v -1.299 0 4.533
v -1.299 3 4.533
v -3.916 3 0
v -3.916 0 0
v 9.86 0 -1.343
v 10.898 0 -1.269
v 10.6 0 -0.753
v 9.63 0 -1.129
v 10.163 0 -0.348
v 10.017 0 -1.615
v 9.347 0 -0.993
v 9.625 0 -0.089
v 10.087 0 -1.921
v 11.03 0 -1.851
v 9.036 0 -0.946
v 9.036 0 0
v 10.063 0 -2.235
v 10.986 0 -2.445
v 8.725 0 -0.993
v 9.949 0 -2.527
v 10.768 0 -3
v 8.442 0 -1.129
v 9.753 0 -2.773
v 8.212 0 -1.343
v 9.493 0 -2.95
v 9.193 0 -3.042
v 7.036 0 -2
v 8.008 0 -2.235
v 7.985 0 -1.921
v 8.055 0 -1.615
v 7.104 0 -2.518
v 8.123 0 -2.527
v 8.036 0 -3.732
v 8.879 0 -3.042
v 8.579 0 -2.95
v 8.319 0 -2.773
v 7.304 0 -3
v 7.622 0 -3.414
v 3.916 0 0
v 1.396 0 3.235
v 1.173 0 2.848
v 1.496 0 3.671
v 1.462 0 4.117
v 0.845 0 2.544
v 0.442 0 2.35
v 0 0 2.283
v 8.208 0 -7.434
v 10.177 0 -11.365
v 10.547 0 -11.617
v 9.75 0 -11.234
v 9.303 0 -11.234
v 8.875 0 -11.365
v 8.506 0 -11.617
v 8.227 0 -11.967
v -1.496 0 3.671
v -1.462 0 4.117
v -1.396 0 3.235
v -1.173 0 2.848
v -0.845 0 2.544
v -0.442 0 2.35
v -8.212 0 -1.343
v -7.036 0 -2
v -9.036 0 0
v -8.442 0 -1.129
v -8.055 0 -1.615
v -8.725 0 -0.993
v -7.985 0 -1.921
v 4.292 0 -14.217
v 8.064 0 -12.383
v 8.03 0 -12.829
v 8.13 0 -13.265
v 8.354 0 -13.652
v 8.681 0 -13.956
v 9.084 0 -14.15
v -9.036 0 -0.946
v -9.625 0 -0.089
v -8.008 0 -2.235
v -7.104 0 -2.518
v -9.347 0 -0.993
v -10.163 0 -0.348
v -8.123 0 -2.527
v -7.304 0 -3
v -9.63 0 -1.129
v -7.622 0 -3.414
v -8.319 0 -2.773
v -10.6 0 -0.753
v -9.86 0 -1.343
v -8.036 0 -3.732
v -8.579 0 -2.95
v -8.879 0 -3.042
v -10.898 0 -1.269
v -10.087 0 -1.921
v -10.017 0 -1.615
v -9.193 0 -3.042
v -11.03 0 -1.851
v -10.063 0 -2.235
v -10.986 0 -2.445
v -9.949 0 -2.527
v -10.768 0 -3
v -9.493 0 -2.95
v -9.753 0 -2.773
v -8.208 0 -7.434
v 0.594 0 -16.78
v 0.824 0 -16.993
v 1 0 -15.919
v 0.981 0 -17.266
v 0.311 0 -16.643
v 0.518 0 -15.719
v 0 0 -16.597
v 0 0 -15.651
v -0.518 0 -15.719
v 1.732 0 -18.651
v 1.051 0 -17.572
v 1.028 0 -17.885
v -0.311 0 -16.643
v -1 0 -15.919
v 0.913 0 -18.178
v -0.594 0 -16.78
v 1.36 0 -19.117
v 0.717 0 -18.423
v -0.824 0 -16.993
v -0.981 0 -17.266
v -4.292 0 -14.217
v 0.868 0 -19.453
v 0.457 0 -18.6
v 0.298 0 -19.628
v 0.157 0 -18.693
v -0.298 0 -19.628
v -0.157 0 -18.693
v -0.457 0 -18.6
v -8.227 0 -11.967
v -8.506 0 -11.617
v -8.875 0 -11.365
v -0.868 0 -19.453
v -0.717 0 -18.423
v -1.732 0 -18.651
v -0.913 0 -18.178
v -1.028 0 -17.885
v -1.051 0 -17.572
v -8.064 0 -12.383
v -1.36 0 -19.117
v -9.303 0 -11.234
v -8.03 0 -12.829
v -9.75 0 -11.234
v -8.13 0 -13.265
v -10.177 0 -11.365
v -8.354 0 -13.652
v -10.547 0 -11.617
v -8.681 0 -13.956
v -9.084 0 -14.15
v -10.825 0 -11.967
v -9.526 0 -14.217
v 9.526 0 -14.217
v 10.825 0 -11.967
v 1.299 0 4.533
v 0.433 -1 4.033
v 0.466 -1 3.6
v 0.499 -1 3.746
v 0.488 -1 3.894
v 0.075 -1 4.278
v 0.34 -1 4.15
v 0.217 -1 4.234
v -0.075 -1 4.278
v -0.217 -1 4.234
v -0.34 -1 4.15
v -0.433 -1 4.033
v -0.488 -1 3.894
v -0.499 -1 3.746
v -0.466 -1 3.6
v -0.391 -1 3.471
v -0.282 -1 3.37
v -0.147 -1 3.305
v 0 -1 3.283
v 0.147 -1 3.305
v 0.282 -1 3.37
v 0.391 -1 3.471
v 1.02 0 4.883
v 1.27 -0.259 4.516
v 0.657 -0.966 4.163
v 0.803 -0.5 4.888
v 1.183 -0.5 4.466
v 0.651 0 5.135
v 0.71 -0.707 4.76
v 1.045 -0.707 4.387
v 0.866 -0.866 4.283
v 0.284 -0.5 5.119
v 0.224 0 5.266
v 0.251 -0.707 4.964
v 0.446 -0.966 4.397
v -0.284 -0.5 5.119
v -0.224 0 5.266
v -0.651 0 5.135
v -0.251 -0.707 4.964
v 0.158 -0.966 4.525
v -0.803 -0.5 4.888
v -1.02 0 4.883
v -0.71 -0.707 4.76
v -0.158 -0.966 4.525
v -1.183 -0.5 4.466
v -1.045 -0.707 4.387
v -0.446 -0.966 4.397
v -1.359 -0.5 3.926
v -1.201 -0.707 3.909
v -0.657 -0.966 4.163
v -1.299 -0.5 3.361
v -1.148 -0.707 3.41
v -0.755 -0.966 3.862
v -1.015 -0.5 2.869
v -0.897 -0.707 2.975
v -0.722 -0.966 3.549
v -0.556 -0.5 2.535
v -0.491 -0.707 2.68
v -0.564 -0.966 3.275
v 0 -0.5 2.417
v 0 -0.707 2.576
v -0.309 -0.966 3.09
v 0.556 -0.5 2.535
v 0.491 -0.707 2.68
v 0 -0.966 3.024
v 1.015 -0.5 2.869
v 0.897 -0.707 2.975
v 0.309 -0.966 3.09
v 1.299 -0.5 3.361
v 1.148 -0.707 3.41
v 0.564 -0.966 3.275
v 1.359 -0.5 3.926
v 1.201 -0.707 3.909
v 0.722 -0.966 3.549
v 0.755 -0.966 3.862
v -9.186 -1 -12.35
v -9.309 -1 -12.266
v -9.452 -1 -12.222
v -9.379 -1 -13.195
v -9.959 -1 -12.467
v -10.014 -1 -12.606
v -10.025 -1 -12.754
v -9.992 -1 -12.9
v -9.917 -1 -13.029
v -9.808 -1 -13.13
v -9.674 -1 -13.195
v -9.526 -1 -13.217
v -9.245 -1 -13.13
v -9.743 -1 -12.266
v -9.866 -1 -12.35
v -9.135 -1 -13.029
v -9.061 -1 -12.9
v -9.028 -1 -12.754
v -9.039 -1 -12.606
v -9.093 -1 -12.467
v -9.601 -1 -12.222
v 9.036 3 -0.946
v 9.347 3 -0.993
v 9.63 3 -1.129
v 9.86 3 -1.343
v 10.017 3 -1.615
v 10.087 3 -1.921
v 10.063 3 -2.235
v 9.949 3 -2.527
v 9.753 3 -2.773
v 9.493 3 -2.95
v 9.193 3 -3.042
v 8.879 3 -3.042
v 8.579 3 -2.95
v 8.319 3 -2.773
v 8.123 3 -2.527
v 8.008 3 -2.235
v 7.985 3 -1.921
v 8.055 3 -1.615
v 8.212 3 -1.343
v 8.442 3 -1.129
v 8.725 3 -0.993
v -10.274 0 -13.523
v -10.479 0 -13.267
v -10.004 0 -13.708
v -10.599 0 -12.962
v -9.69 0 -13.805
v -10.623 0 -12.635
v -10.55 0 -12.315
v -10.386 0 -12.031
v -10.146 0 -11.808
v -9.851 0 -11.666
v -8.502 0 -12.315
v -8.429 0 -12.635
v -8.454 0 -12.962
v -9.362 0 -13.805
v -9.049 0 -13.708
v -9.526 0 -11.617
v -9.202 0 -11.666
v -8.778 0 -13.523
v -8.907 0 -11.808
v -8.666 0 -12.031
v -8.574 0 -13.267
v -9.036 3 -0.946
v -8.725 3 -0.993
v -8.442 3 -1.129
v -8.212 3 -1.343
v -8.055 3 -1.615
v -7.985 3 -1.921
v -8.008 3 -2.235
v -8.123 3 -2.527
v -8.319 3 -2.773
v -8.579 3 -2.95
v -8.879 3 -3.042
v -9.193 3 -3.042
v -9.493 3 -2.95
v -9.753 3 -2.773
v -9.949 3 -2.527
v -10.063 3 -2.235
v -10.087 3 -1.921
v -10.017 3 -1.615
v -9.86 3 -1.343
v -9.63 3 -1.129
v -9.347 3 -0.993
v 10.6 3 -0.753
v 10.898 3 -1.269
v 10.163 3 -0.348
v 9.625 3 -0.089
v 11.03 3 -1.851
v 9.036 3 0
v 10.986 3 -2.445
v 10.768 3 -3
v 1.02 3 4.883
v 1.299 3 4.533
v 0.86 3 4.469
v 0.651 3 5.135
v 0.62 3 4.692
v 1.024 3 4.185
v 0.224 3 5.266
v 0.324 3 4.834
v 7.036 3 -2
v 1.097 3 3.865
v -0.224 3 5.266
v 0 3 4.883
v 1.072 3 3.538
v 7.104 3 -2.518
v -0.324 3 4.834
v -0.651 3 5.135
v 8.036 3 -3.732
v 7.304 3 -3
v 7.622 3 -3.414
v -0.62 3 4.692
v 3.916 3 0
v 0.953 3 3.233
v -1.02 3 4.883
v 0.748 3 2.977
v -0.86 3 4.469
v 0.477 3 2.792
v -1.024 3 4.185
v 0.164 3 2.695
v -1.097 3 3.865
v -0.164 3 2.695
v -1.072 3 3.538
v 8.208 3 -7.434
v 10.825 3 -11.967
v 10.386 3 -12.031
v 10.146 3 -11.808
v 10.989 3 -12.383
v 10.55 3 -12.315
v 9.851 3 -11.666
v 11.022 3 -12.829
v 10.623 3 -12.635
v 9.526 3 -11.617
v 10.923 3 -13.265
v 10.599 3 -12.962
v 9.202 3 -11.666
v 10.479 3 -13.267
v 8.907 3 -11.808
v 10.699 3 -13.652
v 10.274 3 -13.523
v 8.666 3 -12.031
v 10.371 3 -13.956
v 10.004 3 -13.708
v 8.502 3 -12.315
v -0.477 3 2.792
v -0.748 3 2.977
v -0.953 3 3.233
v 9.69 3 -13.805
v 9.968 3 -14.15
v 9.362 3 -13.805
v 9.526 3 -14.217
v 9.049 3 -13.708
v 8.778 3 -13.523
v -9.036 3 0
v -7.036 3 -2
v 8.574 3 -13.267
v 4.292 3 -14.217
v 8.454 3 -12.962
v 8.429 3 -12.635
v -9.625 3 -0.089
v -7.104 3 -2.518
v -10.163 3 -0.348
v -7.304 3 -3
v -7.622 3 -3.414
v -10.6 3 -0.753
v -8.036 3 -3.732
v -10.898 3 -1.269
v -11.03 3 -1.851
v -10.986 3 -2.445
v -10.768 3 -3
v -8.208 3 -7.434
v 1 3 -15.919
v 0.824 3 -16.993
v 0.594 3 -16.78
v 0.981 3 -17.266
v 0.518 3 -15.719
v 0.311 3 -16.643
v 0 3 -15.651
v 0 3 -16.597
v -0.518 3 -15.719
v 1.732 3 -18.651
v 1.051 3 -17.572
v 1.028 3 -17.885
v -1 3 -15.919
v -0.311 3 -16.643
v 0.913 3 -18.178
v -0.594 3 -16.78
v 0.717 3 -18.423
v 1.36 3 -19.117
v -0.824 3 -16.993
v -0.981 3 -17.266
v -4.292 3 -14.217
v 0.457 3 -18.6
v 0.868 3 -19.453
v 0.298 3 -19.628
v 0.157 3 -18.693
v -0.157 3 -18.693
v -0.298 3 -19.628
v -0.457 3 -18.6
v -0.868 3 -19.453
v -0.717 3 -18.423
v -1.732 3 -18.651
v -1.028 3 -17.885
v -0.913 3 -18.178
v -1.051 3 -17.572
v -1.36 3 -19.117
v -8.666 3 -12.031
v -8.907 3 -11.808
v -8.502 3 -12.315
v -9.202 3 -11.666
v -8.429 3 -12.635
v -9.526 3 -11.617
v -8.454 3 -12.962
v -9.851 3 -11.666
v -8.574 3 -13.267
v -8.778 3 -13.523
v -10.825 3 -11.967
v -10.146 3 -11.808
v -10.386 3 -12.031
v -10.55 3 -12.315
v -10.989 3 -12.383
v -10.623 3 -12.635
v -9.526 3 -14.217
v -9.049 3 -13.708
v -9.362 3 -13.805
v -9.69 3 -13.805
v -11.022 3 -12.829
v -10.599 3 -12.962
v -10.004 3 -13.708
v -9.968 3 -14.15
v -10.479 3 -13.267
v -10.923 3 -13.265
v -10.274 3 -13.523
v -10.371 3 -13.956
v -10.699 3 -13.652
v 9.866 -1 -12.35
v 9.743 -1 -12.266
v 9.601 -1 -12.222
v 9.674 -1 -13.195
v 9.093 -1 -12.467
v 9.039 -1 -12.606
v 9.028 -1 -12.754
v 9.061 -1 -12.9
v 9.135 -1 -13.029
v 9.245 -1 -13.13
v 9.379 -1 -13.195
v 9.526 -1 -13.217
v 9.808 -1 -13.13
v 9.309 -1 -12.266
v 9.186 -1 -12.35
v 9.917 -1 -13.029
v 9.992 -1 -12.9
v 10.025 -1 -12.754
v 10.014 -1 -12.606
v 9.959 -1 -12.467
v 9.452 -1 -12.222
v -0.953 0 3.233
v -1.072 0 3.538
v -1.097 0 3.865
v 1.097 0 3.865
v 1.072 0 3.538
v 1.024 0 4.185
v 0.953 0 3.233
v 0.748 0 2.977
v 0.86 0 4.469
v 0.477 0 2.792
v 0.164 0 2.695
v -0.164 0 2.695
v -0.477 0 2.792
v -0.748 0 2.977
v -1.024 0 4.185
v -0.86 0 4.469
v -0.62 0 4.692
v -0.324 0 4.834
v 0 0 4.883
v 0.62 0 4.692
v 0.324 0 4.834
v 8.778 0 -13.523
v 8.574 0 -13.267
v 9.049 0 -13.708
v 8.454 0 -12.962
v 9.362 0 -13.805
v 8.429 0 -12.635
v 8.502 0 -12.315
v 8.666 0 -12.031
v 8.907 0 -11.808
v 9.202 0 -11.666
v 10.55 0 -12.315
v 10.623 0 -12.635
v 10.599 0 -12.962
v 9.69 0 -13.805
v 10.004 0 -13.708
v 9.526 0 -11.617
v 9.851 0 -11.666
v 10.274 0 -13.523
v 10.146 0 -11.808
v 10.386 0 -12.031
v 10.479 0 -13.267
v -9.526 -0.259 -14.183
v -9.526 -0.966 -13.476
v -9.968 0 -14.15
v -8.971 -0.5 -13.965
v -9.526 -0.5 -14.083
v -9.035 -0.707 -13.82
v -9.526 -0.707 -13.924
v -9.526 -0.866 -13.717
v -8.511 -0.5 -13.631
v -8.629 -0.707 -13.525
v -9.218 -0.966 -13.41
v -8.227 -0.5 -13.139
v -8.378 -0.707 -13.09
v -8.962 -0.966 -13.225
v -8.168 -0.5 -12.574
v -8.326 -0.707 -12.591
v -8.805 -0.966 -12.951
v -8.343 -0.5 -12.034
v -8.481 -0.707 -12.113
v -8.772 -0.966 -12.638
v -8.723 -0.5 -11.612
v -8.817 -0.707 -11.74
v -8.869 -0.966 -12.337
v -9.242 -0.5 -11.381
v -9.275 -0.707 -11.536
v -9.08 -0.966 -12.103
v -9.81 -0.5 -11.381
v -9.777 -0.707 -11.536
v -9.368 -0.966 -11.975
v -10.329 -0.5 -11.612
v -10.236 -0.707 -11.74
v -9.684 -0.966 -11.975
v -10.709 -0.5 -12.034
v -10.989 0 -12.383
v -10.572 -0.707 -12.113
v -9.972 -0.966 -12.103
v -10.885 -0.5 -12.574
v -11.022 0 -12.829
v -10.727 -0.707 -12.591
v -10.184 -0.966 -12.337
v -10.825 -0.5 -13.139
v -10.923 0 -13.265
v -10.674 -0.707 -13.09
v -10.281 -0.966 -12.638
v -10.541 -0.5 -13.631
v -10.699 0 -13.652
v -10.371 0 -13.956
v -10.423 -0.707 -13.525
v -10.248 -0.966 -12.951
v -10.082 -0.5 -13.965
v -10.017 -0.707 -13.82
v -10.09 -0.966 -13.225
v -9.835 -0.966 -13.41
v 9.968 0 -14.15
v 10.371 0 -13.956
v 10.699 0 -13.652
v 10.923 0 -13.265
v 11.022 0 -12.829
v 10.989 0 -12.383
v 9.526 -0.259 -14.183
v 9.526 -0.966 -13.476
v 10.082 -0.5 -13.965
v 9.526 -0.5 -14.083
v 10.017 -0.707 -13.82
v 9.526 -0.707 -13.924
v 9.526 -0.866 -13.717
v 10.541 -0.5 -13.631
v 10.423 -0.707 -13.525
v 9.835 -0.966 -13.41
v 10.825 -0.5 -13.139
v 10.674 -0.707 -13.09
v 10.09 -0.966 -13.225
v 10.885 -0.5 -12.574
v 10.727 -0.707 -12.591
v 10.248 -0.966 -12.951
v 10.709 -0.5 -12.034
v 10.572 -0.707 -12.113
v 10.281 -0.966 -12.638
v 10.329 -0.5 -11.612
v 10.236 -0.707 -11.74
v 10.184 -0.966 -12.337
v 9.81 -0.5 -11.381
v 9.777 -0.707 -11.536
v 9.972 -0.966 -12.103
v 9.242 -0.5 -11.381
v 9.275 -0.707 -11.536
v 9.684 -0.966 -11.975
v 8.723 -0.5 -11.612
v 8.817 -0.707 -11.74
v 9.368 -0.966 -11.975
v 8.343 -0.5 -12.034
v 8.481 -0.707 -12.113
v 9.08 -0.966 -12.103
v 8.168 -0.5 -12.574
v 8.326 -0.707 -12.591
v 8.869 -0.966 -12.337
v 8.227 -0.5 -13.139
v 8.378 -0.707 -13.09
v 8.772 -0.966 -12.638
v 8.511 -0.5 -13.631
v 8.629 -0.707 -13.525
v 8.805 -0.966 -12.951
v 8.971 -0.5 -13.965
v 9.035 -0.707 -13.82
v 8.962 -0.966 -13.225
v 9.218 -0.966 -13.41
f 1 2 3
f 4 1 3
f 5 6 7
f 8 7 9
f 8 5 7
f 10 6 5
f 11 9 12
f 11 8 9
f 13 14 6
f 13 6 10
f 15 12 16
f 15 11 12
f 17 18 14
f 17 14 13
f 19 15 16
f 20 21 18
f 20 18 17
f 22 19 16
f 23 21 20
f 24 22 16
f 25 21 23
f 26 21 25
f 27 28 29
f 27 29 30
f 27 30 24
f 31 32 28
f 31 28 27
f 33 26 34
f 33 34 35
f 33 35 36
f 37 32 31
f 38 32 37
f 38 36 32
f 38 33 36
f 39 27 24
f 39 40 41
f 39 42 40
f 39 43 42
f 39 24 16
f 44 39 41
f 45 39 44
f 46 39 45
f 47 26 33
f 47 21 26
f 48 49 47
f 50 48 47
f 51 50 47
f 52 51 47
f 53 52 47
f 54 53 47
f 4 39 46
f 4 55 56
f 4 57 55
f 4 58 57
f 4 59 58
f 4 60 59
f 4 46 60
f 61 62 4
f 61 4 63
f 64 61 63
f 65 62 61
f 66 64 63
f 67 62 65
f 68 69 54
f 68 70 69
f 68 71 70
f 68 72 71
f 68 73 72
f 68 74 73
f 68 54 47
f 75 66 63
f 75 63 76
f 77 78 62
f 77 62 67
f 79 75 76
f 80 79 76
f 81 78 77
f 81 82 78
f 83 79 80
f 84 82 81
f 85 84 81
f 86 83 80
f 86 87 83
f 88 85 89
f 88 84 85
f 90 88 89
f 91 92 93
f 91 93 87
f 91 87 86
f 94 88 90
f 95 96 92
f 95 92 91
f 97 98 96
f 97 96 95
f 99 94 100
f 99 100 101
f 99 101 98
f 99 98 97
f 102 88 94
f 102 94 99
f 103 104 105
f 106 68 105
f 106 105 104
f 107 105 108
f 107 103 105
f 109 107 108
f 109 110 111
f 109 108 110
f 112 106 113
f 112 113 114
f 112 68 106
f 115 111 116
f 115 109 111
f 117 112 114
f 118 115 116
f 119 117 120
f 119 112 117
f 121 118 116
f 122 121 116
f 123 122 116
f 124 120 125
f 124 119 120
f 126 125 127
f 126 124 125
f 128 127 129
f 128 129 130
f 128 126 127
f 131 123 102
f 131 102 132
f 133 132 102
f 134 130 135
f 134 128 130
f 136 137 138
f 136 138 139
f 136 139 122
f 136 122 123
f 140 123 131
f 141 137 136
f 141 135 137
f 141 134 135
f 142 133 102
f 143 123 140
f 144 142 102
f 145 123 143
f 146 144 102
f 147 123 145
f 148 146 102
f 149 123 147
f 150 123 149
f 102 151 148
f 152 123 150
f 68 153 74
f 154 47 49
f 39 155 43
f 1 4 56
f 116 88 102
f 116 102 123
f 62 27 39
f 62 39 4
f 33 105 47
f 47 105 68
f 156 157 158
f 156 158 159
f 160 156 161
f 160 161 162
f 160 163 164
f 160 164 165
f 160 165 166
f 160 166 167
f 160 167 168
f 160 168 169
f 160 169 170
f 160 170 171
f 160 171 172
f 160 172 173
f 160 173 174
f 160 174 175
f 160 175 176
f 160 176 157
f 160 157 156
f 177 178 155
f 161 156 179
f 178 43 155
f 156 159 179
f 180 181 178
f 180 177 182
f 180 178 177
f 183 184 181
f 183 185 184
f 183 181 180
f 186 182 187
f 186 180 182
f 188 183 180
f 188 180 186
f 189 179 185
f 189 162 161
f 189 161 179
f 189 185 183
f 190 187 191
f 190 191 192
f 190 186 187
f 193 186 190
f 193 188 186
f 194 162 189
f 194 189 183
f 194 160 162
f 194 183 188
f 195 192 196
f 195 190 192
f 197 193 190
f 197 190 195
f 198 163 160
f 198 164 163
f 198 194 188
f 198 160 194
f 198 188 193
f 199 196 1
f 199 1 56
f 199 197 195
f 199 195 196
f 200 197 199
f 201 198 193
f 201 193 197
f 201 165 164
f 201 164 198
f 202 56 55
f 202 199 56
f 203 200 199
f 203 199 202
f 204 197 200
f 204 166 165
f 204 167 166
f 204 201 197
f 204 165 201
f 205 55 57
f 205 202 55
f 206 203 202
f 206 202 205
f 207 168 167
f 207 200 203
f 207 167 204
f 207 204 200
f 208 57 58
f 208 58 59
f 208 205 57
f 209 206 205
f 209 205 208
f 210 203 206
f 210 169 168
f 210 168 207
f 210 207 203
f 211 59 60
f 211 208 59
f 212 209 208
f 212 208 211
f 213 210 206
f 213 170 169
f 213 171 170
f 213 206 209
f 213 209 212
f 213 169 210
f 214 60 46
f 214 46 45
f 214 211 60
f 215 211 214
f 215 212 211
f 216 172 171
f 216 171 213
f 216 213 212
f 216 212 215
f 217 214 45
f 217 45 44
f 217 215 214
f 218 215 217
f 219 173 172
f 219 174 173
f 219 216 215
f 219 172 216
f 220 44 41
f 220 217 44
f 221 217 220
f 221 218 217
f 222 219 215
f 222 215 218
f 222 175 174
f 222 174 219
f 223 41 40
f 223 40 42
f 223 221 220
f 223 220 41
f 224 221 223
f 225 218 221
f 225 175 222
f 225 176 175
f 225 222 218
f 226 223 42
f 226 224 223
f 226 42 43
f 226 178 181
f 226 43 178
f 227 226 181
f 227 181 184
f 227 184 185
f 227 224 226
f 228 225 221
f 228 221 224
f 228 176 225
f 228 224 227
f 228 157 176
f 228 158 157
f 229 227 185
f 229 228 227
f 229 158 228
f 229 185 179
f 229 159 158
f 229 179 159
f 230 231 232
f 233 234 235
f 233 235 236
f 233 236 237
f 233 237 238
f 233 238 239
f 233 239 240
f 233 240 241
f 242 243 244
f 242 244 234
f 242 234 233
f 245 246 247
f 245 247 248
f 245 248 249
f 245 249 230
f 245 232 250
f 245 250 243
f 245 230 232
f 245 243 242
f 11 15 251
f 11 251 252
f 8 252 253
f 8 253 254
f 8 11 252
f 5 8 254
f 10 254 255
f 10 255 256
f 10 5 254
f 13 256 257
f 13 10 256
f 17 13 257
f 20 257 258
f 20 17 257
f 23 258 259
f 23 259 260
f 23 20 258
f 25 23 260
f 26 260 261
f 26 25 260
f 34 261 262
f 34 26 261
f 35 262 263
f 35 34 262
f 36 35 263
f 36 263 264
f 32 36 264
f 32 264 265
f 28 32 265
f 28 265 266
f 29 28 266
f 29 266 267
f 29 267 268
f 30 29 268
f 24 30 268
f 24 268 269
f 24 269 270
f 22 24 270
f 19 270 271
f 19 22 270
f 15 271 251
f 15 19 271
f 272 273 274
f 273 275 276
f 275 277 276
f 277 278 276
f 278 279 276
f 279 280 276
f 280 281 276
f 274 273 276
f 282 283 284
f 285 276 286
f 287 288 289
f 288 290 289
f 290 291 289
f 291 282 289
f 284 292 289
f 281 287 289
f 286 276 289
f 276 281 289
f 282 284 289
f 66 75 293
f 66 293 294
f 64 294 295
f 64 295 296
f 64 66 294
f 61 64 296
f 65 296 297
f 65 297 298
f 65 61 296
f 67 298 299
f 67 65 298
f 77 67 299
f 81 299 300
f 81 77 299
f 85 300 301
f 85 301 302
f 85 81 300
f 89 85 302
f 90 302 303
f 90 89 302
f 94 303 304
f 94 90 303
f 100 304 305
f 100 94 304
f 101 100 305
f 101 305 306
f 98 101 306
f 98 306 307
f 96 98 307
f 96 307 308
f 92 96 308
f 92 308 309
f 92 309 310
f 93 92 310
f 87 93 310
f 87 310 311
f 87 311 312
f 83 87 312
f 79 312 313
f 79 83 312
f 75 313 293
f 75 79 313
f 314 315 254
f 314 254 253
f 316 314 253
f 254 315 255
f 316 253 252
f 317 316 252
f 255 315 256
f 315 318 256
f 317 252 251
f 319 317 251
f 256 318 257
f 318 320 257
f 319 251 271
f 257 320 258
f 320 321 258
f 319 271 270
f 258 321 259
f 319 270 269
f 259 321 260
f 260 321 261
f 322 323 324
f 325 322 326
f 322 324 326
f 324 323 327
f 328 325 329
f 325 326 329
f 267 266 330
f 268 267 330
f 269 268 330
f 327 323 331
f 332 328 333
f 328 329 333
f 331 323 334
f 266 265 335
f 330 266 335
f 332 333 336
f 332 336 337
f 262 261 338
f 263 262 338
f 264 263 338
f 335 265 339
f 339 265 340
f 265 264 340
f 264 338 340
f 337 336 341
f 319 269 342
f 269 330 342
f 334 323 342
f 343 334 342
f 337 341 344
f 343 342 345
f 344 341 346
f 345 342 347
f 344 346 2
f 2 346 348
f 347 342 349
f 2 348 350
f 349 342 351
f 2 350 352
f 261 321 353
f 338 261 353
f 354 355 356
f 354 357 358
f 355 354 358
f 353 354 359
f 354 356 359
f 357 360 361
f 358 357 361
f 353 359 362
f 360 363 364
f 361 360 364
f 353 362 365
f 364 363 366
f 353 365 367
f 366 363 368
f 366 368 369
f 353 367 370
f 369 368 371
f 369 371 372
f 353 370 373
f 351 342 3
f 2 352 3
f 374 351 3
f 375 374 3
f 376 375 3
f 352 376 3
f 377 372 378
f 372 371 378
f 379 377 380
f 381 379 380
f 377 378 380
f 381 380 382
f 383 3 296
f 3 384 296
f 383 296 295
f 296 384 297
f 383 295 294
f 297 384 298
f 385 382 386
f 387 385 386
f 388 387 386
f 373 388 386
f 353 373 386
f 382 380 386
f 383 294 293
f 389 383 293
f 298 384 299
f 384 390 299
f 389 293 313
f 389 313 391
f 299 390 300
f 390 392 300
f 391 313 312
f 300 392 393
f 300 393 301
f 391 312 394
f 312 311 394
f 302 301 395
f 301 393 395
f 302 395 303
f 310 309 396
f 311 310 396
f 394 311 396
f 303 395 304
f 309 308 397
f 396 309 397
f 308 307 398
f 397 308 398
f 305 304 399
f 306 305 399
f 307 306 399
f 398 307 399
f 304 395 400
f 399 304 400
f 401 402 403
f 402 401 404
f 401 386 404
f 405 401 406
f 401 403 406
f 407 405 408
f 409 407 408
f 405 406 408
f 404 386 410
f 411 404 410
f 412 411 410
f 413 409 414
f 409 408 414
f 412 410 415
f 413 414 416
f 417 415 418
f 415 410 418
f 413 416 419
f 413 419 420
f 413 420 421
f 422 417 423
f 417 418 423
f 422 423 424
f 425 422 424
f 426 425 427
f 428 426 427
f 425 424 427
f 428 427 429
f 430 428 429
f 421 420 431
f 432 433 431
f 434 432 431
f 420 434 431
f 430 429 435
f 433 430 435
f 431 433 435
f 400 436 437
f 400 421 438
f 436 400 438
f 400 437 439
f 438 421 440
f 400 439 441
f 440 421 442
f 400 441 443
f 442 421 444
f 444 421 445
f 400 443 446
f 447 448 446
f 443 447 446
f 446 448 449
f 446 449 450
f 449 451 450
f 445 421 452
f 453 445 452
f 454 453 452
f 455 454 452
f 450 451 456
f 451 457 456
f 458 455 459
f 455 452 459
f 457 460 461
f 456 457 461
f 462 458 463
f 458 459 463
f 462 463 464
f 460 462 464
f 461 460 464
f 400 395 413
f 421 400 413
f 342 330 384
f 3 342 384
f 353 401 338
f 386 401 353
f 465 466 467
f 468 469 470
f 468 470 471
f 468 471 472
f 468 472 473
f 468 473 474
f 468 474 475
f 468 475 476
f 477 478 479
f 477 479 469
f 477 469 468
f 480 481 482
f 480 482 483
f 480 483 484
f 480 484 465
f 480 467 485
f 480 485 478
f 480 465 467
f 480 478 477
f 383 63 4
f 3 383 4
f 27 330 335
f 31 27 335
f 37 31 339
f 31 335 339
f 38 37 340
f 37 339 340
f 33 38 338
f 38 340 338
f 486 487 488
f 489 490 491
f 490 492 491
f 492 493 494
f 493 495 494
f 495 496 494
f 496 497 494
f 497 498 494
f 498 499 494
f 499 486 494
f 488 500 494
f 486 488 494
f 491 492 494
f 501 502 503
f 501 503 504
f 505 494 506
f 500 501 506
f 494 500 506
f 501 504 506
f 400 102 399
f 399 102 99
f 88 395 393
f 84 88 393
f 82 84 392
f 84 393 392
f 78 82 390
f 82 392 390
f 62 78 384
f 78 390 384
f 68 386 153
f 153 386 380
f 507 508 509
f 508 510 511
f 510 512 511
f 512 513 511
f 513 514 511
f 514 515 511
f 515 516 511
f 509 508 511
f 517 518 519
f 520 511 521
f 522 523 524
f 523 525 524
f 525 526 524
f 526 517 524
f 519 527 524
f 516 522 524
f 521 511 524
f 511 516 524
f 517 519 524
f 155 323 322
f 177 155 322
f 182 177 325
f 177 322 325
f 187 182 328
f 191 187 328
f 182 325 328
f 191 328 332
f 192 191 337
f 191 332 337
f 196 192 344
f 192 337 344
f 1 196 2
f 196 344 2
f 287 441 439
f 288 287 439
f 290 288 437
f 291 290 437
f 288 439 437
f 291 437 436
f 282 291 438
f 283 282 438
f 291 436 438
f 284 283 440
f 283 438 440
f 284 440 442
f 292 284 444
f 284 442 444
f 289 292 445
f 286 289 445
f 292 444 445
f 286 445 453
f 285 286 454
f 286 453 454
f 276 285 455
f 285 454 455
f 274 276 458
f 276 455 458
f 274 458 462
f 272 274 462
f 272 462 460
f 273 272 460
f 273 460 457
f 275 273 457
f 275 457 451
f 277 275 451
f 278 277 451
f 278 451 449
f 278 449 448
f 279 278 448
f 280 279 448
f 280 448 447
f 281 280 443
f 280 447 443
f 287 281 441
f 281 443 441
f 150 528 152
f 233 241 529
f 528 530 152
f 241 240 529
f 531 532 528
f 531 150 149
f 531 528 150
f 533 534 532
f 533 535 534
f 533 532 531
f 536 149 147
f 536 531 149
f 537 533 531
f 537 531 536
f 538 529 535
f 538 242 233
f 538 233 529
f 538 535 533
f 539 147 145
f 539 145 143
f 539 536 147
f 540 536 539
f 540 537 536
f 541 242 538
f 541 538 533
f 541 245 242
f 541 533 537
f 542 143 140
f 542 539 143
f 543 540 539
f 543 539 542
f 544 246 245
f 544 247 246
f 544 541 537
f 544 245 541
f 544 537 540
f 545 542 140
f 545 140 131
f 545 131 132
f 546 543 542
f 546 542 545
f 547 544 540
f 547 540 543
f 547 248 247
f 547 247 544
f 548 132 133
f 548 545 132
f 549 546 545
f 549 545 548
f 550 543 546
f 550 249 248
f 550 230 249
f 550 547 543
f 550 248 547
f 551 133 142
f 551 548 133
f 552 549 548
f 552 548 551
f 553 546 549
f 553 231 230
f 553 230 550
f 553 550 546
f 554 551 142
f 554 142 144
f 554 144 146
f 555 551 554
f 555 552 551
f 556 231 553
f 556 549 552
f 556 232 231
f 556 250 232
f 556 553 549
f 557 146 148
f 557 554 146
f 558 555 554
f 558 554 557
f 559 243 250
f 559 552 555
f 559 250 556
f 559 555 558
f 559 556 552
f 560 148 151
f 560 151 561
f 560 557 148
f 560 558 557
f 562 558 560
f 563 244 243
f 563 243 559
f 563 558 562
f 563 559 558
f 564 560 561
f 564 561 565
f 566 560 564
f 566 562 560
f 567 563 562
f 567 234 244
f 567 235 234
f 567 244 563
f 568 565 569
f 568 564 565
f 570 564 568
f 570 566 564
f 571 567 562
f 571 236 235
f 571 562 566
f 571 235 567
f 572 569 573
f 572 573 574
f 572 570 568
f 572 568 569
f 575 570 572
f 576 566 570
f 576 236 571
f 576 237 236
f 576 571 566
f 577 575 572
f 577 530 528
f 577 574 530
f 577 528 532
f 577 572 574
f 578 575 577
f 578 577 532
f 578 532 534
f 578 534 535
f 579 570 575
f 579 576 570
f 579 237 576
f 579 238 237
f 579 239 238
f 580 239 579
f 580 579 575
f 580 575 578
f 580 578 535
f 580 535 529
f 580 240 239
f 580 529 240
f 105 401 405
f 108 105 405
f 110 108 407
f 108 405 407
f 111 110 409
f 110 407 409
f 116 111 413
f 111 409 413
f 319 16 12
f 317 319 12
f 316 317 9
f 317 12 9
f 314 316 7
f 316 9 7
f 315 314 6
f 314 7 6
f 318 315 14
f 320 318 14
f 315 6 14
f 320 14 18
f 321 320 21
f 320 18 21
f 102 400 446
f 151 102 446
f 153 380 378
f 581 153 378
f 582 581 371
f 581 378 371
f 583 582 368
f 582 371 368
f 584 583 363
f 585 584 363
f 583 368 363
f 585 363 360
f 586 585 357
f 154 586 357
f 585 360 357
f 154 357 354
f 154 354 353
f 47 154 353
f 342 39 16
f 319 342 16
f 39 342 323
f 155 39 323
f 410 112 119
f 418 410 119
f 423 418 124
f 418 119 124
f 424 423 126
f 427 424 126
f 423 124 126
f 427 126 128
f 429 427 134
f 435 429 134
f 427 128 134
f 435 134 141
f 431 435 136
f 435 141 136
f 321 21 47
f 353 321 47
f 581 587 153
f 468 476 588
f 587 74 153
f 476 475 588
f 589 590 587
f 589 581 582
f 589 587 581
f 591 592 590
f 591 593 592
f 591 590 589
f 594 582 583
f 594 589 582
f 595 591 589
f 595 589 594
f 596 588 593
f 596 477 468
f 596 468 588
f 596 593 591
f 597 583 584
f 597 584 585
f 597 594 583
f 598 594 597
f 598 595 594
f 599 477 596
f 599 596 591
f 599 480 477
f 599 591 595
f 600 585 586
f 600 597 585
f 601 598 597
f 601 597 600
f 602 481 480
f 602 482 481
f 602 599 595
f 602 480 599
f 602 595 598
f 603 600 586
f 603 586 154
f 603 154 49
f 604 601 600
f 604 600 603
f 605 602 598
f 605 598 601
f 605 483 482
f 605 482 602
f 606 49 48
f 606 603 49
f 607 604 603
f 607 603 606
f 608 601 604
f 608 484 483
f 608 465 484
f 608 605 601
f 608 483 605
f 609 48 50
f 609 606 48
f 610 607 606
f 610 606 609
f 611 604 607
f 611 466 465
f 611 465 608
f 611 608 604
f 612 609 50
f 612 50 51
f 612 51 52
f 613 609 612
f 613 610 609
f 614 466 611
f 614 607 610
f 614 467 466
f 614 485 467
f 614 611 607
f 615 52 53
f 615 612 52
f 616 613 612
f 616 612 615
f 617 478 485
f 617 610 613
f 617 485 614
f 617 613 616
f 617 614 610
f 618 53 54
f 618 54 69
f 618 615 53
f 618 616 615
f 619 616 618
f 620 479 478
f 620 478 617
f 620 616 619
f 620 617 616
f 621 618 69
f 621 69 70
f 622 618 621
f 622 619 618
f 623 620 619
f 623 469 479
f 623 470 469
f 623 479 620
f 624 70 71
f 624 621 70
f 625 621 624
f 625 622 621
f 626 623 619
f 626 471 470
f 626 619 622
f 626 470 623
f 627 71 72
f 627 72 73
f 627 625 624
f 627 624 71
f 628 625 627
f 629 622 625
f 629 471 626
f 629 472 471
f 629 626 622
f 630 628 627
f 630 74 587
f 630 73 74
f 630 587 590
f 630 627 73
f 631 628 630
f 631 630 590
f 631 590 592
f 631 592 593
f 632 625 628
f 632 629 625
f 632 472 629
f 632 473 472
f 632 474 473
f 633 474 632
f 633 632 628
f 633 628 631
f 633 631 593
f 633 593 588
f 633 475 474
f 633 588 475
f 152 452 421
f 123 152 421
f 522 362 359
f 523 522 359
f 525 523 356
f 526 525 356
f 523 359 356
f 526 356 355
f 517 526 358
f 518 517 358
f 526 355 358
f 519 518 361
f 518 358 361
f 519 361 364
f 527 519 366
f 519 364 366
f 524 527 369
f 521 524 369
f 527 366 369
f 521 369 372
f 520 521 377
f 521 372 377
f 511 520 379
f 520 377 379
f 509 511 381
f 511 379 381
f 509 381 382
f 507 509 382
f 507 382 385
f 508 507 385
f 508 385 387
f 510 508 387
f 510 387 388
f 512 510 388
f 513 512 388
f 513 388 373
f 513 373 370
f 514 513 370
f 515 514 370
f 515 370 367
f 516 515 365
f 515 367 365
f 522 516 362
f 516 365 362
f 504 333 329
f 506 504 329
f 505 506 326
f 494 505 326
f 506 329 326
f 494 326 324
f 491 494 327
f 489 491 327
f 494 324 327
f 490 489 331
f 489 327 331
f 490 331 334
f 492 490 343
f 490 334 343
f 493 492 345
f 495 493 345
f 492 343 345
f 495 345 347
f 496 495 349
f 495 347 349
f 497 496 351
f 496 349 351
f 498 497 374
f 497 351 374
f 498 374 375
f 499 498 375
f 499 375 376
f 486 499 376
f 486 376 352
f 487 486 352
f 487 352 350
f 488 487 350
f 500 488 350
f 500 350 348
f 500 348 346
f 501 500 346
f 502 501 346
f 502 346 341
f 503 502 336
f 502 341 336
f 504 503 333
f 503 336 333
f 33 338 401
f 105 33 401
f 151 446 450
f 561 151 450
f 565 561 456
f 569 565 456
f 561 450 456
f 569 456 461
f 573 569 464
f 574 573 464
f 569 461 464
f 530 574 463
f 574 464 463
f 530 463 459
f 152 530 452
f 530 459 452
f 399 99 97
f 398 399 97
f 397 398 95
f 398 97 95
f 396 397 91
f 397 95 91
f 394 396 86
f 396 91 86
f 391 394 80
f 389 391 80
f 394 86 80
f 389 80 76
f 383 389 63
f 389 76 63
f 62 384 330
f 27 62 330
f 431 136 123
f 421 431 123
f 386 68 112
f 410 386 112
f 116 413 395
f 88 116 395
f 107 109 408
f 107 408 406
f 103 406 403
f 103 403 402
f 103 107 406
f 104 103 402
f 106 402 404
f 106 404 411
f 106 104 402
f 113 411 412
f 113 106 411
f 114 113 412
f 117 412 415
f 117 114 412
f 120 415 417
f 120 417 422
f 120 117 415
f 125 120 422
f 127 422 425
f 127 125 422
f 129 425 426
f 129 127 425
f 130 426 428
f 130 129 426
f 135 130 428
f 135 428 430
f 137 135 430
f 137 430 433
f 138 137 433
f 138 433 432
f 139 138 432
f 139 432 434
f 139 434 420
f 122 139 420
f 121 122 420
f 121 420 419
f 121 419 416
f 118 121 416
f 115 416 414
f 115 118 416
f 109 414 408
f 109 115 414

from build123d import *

# Parameters (mm, degrees)
SKETCH1_R           = 1.054
BOSS_EXTRUDE1_DEPTH = 3
SKETCH3_R           = 1.1
BOSS_EXTRUDE2_DEPTH = 3
CUT_EXTRUDE1_DEPTH  = 23.736281859
SKETCH4_R           = 1.5
BOSS_EXTRUDE3_DEPTH = 1
FILLET1_R           = 1


with BuildPart() as part:
    # Sketch1 → Boss-Extrude1 (new body)
    with BuildSketch(Plane(origin=(0, 0, 0), x_dir=(1, 0, 0), z_dir=(0, 1, 0))):
        with BuildLine():
            Line((0, 0), (9.035898385, 0))
            ThreePointArc((9.035898385, 0), (10.767949192, 1), (10.767949192, 3))
            Line((10.767949192, 3), (1.732050808, 18.650635095))
            ThreePointArc((1.732050808, 18.650635095), (0, 19.650635095), (-1.732050808, 18.650635095))
            Line((-1.732050808, 18.650635095), (-10.767949192, 3))
            ThreePointArc((-10.767949192, 3), (-10.767949192, 1), (-9.035898385, 0))
            Line((-9.035898385, 0), (0, 0))
        make_face()
        with Locations(Location((0, 17.650635095, 0), (0, 0, 270))):
            Circle(SKETCH1_R, mode=Mode.SUBTRACT)
        with Locations(Location((-9.035898385, 2, 0), (0, 0, 270))):
            Circle(SKETCH1_R, mode=Mode.SUBTRACT)
        with Locations(Location((9.035898385, 2, 0), (0, 0, 270))):
            Circle(SKETCH1_R, mode=Mode.SUBTRACT)
    extrude(amount=BOSS_EXTRUDE1_DEPTH)

    # Sketch3 → Boss-Extrude2 (add)
    with BuildSketch(Plane(origin=(0, 3, 0), x_dir=(1, 0, 0), z_dir=(0, 1, 0))):
        with BuildLine():
            Line((-9.526279442, 14.216878365), (9.526279442, 14.216878365))
            ThreePointArc((9.526279442, 14.216878365), (10.825317547, 13.466878365), (10.825317547, 11.966878365))
            Line((10.825317547, 11.966878365), (1.299038106, -4.533121635))
            ThreePointArc((1.299038106, -4.533121635), (0, -5.283121635), (-1.299038106, -4.533121635))
            Line((-1.299038106, -4.533121635), (-10.825317547, 11.966878365))
            ThreePointArc((-10.825317547, 11.966878365), (-10.825317547, 13.466878365), (-9.526279442, 14.216878365))
        make_face()
        with Locations(Location((0, -3.783121635, 0), (0, 0, 270))):
            Circle(SKETCH3_R, mode=Mode.SUBTRACT)
        with Locations(Location((-9.526279442, 12.716878365, 0), (0, 0, 270))):
            Circle(SKETCH3_R, mode=Mode.SUBTRACT)
        with Locations(Location((9.526279442, 12.716878365, 0), (0, 0, 270))):
            Circle(SKETCH3_R, mode=Mode.SUBTRACT)
    extrude(amount=-BOSS_EXTRUDE2_DEPTH)

    # Sketch2 → Cut-Extrude1 (cut, through all)
    with BuildSketch(Plane(origin=(0, 3, 0), x_dir=(1, 0, 0), z_dir=(0, 1, 0))):
        with BuildLine():
            Line((-1, 15.918584287), (-8.035898385, 3.732050808))
            ThreePointArc((-8.035898385, 3.732050808), (-7.303847577, 3), (-7.035898385, 2))
            Line((-7.035898385, 2), (7.035898385, 2))
            ThreePointArc((7.035898385, 2), (7.303847577, 3), (8.035898385, 3.732050808))
            Line((8.035898385, 3.732050808), (1, 15.918584287))
            ThreePointArc((1, 15.918584287), (0, 15.650635095), (-1, 15.918584287))
        make_face()
    extrude(amount=-CUT_EXTRUDE1_DEPTH, mode=Mode.SUBTRACT)

    # Sketch4 → Boss-Extrude3 (add)
    with BuildSketch(Plane.XZ):
        with Locations(Location((0, 3.783121635, 0), (0, 0, 30))):
            Circle(SKETCH4_R)
        with Locations(Location((9.526279442, -12.716878365, 0), (0, 0, 270))):
            Circle(SKETCH4_R)
        with Locations(Location((-9.526279442, -12.716878365, 0), (0, 0, 270))):
            Circle(SKETCH4_R)
    extrude(amount=BOSS_EXTRUDE3_DEPTH)

    # Fillet1
    fillet1_edges = [part.edges().sort_by_distance(p)[0] for p in [
        (-1.299038106, -1, 3.033121635),
        (9.526279442, -1, -11.216878365),
        (-9.526279442, -1, -11.216878365),
    ]]
    fillet(fillet1_edges, radius=FILLET1_R - 0.0001)  # a hair under: the kernel refuses the full size


solid = part.part
